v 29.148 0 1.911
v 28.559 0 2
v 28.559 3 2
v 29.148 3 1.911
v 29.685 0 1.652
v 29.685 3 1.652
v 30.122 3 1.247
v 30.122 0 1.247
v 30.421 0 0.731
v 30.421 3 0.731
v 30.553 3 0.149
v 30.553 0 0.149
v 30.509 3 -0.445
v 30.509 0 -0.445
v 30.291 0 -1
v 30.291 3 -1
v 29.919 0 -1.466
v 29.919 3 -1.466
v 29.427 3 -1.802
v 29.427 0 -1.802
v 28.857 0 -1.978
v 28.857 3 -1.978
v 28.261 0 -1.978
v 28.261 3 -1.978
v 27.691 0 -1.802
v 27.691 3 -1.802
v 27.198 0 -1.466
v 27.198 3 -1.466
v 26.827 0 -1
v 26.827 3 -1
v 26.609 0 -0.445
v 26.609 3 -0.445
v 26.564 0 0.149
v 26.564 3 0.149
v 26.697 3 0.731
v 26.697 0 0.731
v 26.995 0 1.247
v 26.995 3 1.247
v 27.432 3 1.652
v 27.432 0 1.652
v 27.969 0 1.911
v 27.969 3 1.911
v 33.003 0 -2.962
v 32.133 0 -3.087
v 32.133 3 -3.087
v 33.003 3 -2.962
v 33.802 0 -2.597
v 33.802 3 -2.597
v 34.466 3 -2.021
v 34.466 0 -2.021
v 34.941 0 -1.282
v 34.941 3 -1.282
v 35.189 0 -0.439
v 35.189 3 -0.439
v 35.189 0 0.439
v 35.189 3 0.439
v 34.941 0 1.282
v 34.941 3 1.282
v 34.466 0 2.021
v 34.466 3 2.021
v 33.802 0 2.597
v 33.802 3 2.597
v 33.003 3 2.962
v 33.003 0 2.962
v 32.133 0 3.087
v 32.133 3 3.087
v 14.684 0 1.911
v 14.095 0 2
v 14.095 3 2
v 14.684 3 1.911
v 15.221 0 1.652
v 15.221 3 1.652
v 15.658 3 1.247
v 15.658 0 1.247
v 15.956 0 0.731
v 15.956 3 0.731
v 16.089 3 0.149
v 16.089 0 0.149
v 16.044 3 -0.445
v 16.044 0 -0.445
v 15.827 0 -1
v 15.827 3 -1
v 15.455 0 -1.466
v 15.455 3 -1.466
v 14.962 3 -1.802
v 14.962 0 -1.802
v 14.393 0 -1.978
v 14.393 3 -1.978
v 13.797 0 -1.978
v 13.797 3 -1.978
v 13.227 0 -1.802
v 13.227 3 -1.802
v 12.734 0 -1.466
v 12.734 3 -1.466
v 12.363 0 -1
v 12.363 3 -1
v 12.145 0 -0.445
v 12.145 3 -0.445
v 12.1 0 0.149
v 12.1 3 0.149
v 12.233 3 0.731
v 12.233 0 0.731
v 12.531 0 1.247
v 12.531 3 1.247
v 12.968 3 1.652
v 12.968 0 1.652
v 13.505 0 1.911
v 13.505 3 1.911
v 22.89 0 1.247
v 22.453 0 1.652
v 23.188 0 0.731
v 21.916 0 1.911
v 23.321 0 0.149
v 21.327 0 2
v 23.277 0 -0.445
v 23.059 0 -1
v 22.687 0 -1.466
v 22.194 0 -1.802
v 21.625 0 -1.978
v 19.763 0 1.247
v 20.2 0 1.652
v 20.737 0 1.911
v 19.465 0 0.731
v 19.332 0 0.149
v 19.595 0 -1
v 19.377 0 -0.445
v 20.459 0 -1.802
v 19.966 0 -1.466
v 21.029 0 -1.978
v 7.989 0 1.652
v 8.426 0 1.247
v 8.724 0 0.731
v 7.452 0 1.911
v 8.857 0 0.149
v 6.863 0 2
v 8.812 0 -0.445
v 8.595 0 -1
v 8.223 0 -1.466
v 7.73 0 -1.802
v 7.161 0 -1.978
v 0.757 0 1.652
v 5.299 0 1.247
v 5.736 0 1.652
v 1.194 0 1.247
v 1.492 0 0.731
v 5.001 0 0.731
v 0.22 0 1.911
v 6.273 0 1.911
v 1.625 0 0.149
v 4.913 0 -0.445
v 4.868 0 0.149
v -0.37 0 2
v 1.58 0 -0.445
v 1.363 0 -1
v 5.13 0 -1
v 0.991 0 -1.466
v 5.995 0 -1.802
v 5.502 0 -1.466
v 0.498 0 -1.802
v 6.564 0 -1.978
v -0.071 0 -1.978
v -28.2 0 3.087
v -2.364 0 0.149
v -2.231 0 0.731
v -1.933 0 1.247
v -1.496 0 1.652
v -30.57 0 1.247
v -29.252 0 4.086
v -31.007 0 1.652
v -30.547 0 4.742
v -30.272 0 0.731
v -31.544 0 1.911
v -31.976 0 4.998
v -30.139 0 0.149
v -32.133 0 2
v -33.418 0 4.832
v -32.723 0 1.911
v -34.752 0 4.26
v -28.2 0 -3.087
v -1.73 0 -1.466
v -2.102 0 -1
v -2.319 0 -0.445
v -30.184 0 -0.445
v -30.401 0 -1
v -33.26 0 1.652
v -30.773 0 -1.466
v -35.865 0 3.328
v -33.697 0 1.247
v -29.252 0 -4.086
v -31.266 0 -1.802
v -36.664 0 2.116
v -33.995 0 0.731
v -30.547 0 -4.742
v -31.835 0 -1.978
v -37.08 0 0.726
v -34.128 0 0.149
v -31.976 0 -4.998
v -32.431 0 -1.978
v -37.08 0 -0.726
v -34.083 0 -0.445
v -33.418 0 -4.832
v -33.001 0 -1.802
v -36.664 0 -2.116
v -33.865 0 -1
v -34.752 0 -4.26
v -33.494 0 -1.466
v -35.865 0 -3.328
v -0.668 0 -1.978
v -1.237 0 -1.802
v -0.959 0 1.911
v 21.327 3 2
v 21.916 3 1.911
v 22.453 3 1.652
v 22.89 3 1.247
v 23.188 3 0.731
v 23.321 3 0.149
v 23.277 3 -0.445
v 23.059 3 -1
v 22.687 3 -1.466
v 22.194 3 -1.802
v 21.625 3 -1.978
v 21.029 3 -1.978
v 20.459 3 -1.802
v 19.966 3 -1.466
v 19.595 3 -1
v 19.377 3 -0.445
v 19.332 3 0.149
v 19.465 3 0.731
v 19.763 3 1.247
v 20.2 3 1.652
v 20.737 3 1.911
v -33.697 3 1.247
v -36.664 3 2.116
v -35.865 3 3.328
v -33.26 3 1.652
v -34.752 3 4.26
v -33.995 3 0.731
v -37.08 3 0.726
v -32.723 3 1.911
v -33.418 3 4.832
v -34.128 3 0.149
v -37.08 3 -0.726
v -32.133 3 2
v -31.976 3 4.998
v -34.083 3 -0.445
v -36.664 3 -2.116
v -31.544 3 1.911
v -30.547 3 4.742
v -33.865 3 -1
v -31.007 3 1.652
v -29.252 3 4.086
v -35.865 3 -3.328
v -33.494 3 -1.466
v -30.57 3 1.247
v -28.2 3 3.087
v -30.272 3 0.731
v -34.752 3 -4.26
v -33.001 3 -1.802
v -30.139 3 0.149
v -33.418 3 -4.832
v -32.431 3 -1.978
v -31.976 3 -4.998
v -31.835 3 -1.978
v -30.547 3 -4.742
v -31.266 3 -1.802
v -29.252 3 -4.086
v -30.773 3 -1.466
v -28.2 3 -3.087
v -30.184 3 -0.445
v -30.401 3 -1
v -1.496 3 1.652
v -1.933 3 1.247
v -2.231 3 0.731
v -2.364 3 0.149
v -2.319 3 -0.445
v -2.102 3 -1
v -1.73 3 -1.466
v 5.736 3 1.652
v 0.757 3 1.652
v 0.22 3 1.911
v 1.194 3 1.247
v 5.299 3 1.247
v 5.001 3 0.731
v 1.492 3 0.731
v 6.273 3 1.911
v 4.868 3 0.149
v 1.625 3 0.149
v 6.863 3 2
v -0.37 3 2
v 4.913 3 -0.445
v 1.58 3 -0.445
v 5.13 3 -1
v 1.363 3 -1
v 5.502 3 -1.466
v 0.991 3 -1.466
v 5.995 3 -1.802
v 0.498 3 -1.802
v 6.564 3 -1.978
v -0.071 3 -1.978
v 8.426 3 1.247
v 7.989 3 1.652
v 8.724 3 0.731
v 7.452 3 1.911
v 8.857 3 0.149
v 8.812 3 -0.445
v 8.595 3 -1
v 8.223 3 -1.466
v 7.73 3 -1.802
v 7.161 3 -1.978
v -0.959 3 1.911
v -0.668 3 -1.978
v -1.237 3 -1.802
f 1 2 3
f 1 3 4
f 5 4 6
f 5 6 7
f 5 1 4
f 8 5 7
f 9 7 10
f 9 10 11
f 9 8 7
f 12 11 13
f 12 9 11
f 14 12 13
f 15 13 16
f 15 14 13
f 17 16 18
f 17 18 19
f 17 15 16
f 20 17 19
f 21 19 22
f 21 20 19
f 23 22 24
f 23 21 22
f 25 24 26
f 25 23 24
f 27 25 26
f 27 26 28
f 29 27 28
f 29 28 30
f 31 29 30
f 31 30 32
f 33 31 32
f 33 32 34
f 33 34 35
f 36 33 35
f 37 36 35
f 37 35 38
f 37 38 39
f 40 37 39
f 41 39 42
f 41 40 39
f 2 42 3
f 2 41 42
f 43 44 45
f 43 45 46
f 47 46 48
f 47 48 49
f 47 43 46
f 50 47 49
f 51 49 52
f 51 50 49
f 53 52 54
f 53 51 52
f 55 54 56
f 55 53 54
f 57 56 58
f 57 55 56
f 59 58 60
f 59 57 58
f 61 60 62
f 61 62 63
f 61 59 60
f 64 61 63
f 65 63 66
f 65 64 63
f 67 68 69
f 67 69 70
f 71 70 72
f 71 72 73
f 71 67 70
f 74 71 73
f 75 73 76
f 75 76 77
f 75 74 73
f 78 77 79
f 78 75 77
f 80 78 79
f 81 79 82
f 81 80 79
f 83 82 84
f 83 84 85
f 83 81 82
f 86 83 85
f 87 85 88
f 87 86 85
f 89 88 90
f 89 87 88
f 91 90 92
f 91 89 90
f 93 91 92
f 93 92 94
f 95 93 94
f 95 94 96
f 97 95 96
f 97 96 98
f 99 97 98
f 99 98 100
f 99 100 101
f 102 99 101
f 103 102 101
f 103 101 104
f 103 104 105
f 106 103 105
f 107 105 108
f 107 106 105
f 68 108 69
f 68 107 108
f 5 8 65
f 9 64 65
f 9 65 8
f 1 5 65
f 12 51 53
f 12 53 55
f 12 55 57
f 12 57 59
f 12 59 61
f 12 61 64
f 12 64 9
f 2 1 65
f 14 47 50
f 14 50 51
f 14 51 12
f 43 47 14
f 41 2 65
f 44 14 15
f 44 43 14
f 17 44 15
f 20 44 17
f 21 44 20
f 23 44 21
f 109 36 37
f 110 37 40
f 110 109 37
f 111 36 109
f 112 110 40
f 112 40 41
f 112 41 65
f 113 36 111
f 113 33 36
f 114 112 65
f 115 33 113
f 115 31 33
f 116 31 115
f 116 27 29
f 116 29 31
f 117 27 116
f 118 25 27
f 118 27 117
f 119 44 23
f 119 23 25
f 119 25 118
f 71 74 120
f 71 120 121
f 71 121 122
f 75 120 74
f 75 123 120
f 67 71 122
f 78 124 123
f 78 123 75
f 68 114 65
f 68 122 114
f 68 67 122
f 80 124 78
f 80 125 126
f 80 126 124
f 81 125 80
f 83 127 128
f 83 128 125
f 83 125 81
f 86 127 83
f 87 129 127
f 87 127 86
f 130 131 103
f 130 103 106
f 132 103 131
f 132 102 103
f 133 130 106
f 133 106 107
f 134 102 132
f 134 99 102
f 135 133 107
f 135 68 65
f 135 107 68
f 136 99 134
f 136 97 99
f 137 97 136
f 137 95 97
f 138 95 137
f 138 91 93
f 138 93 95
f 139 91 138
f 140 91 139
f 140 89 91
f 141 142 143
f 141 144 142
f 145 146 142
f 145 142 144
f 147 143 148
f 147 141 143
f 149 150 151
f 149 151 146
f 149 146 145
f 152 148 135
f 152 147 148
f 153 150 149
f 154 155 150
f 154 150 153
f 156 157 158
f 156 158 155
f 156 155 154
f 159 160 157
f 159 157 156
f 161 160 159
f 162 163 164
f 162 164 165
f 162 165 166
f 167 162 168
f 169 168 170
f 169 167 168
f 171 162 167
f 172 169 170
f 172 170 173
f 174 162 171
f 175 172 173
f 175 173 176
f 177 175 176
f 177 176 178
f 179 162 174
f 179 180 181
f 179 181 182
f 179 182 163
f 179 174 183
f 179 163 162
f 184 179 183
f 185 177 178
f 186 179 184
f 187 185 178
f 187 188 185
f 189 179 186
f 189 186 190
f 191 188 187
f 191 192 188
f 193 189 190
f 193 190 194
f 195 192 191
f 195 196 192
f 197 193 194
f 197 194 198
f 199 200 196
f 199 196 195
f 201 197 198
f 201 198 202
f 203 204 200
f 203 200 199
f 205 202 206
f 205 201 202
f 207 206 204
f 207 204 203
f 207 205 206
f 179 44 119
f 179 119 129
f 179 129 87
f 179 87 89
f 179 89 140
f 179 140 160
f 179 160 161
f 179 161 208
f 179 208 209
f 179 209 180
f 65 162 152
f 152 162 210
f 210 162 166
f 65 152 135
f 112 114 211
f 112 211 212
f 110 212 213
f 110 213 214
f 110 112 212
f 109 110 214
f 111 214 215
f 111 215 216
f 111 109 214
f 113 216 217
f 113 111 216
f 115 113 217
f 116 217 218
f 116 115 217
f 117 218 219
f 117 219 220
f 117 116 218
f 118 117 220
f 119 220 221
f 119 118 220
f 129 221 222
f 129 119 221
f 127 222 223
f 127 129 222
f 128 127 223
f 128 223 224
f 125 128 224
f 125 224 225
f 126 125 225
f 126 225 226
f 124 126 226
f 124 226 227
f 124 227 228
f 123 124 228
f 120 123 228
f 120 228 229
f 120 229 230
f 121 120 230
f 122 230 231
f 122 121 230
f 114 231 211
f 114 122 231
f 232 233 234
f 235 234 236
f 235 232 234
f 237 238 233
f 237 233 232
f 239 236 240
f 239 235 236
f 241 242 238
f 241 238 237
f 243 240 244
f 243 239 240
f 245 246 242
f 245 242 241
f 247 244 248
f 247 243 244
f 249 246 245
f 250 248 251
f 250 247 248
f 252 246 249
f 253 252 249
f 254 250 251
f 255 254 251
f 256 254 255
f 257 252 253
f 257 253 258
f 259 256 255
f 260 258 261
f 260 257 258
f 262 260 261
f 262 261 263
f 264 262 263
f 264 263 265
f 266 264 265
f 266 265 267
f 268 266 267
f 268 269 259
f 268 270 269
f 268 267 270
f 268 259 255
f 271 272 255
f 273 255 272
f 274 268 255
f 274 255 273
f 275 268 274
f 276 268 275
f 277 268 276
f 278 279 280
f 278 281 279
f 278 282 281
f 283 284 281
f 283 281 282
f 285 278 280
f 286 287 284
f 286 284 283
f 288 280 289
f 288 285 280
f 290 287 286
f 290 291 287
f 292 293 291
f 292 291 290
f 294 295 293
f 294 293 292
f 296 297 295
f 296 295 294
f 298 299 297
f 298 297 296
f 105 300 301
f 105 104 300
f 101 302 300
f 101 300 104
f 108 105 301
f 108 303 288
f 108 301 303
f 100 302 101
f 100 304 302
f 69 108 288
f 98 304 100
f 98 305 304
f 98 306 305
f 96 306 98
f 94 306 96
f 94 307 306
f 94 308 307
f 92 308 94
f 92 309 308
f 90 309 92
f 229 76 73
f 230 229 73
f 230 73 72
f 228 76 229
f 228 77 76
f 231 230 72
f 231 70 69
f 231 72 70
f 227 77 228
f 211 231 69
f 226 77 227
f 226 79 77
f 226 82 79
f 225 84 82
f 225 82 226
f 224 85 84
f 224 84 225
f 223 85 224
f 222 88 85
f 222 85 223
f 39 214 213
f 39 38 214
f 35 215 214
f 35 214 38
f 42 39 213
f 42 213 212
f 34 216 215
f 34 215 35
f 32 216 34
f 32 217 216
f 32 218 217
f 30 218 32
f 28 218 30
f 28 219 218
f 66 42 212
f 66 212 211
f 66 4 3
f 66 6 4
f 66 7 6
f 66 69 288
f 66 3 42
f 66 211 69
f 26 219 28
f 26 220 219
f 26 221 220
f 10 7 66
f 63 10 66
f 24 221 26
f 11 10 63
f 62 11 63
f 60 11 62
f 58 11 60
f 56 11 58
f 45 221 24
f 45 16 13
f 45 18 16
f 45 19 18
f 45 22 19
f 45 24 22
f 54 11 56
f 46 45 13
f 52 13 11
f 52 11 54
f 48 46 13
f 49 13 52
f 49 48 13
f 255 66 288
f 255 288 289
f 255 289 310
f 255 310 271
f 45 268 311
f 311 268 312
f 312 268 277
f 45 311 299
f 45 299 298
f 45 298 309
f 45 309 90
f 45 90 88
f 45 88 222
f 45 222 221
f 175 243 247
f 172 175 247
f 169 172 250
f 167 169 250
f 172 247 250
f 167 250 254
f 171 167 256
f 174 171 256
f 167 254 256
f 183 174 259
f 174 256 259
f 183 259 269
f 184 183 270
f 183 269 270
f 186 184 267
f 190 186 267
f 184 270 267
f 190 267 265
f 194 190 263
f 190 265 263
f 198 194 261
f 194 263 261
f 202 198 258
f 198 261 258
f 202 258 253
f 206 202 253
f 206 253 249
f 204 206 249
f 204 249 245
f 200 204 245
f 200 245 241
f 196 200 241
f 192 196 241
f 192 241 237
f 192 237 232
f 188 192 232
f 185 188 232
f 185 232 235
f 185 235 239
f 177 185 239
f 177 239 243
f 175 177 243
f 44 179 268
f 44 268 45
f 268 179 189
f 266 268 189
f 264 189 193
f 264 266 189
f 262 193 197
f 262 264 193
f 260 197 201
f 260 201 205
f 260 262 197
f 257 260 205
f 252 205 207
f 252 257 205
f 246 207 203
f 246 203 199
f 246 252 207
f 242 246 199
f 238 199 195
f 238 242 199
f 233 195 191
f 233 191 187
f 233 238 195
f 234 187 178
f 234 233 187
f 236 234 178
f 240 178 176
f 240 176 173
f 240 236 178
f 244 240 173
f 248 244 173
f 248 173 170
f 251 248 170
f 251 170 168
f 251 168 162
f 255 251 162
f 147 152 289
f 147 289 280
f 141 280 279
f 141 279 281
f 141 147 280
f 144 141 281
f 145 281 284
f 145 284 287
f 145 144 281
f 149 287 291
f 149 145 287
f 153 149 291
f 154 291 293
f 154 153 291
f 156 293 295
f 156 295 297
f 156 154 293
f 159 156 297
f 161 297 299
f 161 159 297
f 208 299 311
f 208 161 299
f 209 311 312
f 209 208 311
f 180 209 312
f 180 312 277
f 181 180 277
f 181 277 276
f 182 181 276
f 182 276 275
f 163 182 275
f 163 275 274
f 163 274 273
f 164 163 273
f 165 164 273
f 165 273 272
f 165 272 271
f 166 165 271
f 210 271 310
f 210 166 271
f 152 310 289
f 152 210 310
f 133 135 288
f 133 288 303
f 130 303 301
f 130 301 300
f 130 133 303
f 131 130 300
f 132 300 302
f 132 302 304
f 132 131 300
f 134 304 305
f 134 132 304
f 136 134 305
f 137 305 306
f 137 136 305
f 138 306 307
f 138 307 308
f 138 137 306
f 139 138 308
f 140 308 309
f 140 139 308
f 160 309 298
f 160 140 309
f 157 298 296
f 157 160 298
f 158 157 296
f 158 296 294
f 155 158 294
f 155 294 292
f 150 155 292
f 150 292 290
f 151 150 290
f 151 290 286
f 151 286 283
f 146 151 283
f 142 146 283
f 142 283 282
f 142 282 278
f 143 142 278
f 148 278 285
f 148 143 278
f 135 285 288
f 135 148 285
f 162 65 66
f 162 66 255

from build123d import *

# Parameters (mm, degrees)
SKETCH2_R           = 2
BOSS_EXTRUDE2_DEPTH = 3
SKETCH6_R           = 5
BOSS_EXTRUDE5_DEPTH = 3
SKETCH8_R           = 2
CUT_EXTRUDE3_DEPTH  = 10


with BuildPart() as part:
    # Sketch2 → Boss-Extrude2 (new body)
    with BuildSketch(Plane(origin=(0, 0, 0), x_dir=(1, 0, 0), z_dir=(0, 1, 0))):
        with BuildLine():
            Line((-32.1334036, 3.086573492), (32.1334036, 3.086573492))
            ThreePointArc((32.1334036, 3.086573492), (35.219977092, 0), (32.1334036, -3.086573492))
            Line((32.1334036, -3.086573492), (-32.1334036, -3.086573492))
            Line((-32.1334036, -3.086573492), (-32.1334036, 3.086573492))
        make_face()
        with Locations(Location((28.558761332, 0, 0), (0, 0, 270))):
            Circle(SKETCH2_R, mode=Mode.SUBTRACT)
        with Locations(Location((21.326683463, 0, 0), (0, 0, 270))):
            Circle(SKETCH2_R, mode=Mode.SUBTRACT)
        with Locations(Location((14.094605594, 0, 0), (0, 0, 270))):
            Circle(SKETCH2_R, mode=Mode.SUBTRACT)
        with Locations(Location((6.862527725, 0, 0), (0, 0, 270))):
            Circle(SKETCH2_R, mode=Mode.SUBTRACT)
        with Locations(Location((-0.369550144, 0, 0), (0, 0, 270))):
            Circle(SKETCH2_R, mode=Mode.SUBTRACT)
    extrude(amount=BOSS_EXTRUDE2_DEPTH)

    # Sketch6 → Boss-Extrude5 (add)
    with BuildSketch(Plane(origin=(0, 3, 0), x_dir=(1, 0, 0), z_dir=(0, 1, 0))):
        with Locations((-32.1334036, 0)):
            Circle(SKETCH6_R)
    extrude(amount=-BOSS_EXTRUDE5_DEPTH)

    # Sketch8 → Cut-Extrude3 (cut)
    with BuildSketch(Plane(origin=(0, 3, 0), x_dir=(1, 0, 0), z_dir=(0, 1, 0))):
        with Locations(Location((-32.1334036, 0, 0), (0, 0, 270))):
            Circle(SKETCH8_R)
    extrude(amount=-CUT_EXTRUDE3_DEPTH, mode=Mode.SUBTRACT)


solid = part.part
